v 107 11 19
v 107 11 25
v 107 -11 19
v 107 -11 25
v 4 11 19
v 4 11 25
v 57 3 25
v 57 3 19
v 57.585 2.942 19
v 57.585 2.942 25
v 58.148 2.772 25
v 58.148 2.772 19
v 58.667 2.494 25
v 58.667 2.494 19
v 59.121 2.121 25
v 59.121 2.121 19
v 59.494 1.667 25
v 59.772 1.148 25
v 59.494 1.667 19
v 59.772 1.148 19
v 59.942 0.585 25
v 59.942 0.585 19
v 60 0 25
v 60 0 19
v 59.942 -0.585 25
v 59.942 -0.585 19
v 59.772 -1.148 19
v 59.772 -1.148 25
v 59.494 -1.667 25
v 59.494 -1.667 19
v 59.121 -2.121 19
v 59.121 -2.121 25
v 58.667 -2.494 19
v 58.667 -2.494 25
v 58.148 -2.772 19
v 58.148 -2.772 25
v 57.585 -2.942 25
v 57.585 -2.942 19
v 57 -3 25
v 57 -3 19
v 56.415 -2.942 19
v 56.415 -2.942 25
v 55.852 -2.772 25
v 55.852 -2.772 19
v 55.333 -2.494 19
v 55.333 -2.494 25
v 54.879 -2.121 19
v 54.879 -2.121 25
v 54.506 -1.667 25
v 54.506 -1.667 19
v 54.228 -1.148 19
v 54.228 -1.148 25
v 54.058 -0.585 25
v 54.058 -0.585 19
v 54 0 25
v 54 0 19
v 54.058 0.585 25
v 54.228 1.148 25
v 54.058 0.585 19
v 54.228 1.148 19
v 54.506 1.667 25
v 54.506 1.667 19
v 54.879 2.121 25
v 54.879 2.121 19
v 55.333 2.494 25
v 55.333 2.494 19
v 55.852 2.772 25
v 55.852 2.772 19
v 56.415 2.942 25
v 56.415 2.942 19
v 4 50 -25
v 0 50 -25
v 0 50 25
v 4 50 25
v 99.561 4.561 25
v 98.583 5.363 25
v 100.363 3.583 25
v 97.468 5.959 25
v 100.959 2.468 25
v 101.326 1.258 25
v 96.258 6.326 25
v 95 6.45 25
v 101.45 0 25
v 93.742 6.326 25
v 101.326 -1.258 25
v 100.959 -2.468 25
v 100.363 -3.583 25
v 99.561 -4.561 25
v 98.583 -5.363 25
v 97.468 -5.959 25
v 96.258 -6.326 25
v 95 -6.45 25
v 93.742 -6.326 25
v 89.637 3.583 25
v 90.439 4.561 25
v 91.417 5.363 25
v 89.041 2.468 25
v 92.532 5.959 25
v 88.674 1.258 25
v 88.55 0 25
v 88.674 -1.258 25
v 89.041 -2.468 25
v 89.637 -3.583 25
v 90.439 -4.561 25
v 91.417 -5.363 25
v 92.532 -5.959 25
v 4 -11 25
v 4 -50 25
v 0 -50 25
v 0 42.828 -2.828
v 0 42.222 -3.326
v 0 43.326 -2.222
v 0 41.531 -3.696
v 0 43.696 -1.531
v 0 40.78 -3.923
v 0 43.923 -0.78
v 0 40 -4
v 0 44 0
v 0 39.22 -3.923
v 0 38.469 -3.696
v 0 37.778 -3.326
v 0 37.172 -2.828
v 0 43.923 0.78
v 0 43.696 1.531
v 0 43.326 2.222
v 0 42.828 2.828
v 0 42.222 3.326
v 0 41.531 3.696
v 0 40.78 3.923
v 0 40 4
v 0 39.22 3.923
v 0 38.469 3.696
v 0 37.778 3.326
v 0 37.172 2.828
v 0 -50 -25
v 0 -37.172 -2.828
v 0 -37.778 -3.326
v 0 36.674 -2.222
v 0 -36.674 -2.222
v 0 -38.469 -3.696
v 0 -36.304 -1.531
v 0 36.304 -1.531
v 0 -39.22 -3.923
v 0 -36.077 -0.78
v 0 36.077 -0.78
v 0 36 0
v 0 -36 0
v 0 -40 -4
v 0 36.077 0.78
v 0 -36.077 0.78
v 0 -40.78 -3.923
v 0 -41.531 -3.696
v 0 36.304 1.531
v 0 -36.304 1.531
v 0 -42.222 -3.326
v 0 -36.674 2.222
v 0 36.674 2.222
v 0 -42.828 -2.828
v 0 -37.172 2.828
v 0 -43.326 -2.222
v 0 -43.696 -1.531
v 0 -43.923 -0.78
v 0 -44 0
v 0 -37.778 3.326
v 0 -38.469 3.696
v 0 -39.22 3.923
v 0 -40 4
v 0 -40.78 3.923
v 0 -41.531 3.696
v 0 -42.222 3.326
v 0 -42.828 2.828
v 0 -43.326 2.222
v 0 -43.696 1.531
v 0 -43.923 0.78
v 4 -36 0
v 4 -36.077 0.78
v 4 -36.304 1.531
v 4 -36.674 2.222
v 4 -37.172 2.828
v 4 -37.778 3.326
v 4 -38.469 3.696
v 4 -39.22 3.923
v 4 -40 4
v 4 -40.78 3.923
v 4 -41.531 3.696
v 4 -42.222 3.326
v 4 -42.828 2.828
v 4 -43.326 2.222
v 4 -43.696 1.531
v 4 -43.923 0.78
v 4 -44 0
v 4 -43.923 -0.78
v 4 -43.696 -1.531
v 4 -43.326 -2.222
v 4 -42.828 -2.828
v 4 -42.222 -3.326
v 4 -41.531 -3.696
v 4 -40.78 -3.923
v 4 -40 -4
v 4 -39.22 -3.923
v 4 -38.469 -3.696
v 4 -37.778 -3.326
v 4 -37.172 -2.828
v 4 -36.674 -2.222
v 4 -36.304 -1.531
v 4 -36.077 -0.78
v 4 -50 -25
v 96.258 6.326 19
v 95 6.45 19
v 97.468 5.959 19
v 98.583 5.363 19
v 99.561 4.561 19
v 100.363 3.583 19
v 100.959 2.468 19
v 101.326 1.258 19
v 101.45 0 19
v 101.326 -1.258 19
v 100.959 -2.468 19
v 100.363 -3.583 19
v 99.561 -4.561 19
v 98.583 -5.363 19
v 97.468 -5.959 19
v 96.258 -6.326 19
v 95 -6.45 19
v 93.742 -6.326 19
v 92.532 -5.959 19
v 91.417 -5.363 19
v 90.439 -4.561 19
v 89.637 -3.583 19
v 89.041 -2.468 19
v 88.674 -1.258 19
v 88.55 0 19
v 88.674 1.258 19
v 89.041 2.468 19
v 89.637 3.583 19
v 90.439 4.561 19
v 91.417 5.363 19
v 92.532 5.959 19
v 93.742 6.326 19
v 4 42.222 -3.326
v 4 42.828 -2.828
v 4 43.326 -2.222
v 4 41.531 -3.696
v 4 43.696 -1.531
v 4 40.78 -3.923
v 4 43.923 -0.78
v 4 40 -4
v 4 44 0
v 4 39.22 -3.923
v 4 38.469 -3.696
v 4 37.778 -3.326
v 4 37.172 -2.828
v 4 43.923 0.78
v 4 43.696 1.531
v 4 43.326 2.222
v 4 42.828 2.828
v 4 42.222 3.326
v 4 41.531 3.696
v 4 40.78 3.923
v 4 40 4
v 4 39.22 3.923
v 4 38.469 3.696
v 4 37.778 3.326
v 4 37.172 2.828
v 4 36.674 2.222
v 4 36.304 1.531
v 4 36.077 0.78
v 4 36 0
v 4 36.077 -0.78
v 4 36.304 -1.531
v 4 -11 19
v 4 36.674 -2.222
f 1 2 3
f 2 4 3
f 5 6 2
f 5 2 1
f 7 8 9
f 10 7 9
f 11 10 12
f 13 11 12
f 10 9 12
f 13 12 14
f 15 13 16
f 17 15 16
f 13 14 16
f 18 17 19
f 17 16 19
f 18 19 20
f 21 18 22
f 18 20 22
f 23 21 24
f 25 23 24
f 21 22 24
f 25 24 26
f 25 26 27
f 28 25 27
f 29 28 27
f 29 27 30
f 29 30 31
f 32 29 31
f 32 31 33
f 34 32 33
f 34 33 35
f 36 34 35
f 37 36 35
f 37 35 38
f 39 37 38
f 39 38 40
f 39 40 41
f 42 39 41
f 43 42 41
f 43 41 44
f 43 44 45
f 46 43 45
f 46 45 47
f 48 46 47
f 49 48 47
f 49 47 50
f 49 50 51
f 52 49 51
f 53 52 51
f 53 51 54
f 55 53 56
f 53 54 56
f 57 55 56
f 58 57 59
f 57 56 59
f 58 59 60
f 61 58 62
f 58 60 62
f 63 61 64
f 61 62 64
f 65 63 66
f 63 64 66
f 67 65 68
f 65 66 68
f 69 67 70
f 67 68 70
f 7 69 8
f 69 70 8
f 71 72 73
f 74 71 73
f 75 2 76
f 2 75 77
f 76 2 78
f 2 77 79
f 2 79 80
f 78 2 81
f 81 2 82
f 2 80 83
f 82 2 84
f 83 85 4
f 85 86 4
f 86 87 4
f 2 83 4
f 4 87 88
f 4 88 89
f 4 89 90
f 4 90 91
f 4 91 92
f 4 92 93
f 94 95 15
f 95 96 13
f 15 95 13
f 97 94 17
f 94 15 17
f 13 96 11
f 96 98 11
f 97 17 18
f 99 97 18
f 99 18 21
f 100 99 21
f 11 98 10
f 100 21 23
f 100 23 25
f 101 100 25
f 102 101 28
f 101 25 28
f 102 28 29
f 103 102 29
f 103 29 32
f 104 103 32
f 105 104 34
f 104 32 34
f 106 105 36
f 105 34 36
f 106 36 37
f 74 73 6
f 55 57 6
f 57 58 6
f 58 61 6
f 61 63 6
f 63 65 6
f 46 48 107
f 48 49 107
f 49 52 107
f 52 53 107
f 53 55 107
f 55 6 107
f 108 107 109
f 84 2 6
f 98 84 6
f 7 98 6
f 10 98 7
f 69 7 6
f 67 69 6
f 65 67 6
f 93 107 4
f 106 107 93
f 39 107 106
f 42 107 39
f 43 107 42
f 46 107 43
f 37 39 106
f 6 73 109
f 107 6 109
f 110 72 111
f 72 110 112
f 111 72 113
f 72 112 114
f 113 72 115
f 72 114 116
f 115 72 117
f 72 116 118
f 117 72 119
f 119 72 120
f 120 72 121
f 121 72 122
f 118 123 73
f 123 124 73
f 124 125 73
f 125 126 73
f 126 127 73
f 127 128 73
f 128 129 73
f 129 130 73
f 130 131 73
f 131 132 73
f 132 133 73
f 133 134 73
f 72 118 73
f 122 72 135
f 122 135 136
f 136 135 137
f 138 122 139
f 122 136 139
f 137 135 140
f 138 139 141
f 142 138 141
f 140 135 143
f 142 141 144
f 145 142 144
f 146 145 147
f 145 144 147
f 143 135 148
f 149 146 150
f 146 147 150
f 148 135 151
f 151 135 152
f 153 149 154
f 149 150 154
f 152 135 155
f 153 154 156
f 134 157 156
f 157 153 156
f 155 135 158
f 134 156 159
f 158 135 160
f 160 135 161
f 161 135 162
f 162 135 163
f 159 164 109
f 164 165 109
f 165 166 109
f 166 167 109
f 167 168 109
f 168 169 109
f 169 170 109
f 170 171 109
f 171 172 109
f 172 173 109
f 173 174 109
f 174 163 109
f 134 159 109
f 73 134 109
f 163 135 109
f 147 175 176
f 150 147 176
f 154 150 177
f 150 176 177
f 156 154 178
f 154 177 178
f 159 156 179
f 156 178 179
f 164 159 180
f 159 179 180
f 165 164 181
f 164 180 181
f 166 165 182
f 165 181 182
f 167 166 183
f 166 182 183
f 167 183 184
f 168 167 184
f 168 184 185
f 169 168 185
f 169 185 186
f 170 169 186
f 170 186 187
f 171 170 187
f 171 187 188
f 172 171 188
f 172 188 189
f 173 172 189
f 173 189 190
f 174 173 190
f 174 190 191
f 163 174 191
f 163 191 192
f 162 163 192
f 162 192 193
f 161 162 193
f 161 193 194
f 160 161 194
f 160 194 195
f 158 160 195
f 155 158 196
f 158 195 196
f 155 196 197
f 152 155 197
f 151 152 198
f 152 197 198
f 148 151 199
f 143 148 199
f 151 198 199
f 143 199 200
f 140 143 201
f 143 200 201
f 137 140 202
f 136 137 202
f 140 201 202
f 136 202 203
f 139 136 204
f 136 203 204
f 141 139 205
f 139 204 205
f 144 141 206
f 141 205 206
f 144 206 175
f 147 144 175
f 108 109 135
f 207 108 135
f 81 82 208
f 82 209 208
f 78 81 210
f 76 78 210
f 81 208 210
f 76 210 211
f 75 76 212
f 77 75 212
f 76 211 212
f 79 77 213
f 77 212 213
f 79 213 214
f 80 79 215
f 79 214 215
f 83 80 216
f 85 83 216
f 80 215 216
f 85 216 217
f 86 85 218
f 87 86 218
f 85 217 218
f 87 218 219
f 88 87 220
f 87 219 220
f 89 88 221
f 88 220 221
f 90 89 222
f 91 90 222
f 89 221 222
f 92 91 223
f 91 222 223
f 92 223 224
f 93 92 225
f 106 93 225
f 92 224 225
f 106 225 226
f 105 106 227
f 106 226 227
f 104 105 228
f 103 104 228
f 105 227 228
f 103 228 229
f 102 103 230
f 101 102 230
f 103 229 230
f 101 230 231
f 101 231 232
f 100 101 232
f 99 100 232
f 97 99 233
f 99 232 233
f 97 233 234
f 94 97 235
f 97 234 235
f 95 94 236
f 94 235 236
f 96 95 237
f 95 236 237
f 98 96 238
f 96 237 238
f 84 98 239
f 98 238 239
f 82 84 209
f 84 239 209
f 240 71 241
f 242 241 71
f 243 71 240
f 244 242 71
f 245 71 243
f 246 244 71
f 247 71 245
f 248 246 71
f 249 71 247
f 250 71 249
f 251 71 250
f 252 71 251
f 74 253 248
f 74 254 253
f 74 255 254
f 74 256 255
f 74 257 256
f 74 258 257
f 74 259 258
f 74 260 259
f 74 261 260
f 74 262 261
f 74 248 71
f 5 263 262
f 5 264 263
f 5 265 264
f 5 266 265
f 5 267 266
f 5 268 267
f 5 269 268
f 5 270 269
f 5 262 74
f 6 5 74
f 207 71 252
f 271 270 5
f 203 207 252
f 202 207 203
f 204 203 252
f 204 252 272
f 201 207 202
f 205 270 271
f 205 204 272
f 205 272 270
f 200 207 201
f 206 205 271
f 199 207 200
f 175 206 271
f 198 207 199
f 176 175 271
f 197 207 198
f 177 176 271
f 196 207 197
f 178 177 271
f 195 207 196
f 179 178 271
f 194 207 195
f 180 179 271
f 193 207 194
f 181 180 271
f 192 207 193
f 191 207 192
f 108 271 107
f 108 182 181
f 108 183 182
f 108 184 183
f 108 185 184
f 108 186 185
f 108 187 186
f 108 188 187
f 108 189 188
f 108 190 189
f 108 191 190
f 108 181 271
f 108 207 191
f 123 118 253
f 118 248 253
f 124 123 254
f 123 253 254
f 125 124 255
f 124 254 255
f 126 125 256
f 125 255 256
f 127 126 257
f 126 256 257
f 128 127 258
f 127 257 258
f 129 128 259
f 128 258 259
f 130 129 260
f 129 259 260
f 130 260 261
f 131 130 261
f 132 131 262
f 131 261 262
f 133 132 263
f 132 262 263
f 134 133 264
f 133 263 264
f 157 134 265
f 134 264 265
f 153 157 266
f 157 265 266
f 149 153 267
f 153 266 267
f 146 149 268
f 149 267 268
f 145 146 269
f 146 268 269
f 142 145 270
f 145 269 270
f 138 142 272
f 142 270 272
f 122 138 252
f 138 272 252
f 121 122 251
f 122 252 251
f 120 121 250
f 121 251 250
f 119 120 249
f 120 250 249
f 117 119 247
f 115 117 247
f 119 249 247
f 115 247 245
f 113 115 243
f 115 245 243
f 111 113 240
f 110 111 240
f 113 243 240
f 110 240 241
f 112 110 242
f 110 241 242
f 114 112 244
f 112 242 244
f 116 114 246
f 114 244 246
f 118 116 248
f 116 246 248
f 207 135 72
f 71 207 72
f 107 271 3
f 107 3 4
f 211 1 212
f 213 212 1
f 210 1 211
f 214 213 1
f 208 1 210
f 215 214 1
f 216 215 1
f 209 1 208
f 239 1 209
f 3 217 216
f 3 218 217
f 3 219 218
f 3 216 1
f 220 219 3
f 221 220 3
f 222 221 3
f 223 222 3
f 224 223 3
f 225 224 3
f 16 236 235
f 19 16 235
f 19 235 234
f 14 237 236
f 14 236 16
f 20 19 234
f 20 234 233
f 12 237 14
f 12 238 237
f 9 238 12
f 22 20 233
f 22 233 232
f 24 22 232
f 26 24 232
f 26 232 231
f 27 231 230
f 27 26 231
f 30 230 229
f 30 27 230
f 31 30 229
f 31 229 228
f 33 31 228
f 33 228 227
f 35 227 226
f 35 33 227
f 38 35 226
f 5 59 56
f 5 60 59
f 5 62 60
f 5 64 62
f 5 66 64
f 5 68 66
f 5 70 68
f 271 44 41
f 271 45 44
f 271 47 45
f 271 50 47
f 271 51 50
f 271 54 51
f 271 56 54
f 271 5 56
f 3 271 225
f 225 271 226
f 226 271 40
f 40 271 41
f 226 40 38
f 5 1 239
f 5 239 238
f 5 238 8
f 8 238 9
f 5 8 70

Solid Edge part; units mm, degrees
sketch "Sketch1" plane through (0, 0, 0) normal (1, 0, 0) x (0, 1, 0)
  line L0 (-50, 25) -> (-50, -25)
  line L1 (-50, -25) -> (50, -25)
  line L2 (50, -25) -> (50, 25)
  line L3 (50, 25) -> (-50, 25)
extrude "Protrusion1" add sketch "Sketch1" along normal blind 4
sketch "Sketch2" plane through (4, 0, 0) normal (1, 0, 0) x (0, 1, 0)
  line L0 (11, 19) -> (-11, 19)
  line L1 (-11, 19) -> (-11, 25)
  line L2 (-11, 25) -> (11, 25)
  line L3 (11, 25) -> (11, 19)
extrude "ExtrudedProtrusion_2" add sketch "Sketch2" along normal blind 103
sketch "Sketch3" plane through (55.5, 0, 19) normal (0, 0, -1) x (0, 1, 0)
  circle A0 centre (0, 39.5) radius 6.45
  circle A1 centre (0, 1.5) radius 3
  dimension "D1" = 12
  dimension "D2" = 6
  dimension "D3" = 50
extrude "ExtrudedCutout_1" cut sketch "Sketch3" against normal blind 28.1055
sketch "Sketch4" plane through (4, 0, 0) normal (1, 0, 0) x (0, 1, 0)
  circle A0 centre (-40, 0) radius 4
  circle A1 centre (40, 0) radius 4
  dimension "D1" = 10
  dimension "D2" = 10
extrude "Cutout1" cut sketch "Sketch4" against normal up to next
properties material "Stainless steel"
